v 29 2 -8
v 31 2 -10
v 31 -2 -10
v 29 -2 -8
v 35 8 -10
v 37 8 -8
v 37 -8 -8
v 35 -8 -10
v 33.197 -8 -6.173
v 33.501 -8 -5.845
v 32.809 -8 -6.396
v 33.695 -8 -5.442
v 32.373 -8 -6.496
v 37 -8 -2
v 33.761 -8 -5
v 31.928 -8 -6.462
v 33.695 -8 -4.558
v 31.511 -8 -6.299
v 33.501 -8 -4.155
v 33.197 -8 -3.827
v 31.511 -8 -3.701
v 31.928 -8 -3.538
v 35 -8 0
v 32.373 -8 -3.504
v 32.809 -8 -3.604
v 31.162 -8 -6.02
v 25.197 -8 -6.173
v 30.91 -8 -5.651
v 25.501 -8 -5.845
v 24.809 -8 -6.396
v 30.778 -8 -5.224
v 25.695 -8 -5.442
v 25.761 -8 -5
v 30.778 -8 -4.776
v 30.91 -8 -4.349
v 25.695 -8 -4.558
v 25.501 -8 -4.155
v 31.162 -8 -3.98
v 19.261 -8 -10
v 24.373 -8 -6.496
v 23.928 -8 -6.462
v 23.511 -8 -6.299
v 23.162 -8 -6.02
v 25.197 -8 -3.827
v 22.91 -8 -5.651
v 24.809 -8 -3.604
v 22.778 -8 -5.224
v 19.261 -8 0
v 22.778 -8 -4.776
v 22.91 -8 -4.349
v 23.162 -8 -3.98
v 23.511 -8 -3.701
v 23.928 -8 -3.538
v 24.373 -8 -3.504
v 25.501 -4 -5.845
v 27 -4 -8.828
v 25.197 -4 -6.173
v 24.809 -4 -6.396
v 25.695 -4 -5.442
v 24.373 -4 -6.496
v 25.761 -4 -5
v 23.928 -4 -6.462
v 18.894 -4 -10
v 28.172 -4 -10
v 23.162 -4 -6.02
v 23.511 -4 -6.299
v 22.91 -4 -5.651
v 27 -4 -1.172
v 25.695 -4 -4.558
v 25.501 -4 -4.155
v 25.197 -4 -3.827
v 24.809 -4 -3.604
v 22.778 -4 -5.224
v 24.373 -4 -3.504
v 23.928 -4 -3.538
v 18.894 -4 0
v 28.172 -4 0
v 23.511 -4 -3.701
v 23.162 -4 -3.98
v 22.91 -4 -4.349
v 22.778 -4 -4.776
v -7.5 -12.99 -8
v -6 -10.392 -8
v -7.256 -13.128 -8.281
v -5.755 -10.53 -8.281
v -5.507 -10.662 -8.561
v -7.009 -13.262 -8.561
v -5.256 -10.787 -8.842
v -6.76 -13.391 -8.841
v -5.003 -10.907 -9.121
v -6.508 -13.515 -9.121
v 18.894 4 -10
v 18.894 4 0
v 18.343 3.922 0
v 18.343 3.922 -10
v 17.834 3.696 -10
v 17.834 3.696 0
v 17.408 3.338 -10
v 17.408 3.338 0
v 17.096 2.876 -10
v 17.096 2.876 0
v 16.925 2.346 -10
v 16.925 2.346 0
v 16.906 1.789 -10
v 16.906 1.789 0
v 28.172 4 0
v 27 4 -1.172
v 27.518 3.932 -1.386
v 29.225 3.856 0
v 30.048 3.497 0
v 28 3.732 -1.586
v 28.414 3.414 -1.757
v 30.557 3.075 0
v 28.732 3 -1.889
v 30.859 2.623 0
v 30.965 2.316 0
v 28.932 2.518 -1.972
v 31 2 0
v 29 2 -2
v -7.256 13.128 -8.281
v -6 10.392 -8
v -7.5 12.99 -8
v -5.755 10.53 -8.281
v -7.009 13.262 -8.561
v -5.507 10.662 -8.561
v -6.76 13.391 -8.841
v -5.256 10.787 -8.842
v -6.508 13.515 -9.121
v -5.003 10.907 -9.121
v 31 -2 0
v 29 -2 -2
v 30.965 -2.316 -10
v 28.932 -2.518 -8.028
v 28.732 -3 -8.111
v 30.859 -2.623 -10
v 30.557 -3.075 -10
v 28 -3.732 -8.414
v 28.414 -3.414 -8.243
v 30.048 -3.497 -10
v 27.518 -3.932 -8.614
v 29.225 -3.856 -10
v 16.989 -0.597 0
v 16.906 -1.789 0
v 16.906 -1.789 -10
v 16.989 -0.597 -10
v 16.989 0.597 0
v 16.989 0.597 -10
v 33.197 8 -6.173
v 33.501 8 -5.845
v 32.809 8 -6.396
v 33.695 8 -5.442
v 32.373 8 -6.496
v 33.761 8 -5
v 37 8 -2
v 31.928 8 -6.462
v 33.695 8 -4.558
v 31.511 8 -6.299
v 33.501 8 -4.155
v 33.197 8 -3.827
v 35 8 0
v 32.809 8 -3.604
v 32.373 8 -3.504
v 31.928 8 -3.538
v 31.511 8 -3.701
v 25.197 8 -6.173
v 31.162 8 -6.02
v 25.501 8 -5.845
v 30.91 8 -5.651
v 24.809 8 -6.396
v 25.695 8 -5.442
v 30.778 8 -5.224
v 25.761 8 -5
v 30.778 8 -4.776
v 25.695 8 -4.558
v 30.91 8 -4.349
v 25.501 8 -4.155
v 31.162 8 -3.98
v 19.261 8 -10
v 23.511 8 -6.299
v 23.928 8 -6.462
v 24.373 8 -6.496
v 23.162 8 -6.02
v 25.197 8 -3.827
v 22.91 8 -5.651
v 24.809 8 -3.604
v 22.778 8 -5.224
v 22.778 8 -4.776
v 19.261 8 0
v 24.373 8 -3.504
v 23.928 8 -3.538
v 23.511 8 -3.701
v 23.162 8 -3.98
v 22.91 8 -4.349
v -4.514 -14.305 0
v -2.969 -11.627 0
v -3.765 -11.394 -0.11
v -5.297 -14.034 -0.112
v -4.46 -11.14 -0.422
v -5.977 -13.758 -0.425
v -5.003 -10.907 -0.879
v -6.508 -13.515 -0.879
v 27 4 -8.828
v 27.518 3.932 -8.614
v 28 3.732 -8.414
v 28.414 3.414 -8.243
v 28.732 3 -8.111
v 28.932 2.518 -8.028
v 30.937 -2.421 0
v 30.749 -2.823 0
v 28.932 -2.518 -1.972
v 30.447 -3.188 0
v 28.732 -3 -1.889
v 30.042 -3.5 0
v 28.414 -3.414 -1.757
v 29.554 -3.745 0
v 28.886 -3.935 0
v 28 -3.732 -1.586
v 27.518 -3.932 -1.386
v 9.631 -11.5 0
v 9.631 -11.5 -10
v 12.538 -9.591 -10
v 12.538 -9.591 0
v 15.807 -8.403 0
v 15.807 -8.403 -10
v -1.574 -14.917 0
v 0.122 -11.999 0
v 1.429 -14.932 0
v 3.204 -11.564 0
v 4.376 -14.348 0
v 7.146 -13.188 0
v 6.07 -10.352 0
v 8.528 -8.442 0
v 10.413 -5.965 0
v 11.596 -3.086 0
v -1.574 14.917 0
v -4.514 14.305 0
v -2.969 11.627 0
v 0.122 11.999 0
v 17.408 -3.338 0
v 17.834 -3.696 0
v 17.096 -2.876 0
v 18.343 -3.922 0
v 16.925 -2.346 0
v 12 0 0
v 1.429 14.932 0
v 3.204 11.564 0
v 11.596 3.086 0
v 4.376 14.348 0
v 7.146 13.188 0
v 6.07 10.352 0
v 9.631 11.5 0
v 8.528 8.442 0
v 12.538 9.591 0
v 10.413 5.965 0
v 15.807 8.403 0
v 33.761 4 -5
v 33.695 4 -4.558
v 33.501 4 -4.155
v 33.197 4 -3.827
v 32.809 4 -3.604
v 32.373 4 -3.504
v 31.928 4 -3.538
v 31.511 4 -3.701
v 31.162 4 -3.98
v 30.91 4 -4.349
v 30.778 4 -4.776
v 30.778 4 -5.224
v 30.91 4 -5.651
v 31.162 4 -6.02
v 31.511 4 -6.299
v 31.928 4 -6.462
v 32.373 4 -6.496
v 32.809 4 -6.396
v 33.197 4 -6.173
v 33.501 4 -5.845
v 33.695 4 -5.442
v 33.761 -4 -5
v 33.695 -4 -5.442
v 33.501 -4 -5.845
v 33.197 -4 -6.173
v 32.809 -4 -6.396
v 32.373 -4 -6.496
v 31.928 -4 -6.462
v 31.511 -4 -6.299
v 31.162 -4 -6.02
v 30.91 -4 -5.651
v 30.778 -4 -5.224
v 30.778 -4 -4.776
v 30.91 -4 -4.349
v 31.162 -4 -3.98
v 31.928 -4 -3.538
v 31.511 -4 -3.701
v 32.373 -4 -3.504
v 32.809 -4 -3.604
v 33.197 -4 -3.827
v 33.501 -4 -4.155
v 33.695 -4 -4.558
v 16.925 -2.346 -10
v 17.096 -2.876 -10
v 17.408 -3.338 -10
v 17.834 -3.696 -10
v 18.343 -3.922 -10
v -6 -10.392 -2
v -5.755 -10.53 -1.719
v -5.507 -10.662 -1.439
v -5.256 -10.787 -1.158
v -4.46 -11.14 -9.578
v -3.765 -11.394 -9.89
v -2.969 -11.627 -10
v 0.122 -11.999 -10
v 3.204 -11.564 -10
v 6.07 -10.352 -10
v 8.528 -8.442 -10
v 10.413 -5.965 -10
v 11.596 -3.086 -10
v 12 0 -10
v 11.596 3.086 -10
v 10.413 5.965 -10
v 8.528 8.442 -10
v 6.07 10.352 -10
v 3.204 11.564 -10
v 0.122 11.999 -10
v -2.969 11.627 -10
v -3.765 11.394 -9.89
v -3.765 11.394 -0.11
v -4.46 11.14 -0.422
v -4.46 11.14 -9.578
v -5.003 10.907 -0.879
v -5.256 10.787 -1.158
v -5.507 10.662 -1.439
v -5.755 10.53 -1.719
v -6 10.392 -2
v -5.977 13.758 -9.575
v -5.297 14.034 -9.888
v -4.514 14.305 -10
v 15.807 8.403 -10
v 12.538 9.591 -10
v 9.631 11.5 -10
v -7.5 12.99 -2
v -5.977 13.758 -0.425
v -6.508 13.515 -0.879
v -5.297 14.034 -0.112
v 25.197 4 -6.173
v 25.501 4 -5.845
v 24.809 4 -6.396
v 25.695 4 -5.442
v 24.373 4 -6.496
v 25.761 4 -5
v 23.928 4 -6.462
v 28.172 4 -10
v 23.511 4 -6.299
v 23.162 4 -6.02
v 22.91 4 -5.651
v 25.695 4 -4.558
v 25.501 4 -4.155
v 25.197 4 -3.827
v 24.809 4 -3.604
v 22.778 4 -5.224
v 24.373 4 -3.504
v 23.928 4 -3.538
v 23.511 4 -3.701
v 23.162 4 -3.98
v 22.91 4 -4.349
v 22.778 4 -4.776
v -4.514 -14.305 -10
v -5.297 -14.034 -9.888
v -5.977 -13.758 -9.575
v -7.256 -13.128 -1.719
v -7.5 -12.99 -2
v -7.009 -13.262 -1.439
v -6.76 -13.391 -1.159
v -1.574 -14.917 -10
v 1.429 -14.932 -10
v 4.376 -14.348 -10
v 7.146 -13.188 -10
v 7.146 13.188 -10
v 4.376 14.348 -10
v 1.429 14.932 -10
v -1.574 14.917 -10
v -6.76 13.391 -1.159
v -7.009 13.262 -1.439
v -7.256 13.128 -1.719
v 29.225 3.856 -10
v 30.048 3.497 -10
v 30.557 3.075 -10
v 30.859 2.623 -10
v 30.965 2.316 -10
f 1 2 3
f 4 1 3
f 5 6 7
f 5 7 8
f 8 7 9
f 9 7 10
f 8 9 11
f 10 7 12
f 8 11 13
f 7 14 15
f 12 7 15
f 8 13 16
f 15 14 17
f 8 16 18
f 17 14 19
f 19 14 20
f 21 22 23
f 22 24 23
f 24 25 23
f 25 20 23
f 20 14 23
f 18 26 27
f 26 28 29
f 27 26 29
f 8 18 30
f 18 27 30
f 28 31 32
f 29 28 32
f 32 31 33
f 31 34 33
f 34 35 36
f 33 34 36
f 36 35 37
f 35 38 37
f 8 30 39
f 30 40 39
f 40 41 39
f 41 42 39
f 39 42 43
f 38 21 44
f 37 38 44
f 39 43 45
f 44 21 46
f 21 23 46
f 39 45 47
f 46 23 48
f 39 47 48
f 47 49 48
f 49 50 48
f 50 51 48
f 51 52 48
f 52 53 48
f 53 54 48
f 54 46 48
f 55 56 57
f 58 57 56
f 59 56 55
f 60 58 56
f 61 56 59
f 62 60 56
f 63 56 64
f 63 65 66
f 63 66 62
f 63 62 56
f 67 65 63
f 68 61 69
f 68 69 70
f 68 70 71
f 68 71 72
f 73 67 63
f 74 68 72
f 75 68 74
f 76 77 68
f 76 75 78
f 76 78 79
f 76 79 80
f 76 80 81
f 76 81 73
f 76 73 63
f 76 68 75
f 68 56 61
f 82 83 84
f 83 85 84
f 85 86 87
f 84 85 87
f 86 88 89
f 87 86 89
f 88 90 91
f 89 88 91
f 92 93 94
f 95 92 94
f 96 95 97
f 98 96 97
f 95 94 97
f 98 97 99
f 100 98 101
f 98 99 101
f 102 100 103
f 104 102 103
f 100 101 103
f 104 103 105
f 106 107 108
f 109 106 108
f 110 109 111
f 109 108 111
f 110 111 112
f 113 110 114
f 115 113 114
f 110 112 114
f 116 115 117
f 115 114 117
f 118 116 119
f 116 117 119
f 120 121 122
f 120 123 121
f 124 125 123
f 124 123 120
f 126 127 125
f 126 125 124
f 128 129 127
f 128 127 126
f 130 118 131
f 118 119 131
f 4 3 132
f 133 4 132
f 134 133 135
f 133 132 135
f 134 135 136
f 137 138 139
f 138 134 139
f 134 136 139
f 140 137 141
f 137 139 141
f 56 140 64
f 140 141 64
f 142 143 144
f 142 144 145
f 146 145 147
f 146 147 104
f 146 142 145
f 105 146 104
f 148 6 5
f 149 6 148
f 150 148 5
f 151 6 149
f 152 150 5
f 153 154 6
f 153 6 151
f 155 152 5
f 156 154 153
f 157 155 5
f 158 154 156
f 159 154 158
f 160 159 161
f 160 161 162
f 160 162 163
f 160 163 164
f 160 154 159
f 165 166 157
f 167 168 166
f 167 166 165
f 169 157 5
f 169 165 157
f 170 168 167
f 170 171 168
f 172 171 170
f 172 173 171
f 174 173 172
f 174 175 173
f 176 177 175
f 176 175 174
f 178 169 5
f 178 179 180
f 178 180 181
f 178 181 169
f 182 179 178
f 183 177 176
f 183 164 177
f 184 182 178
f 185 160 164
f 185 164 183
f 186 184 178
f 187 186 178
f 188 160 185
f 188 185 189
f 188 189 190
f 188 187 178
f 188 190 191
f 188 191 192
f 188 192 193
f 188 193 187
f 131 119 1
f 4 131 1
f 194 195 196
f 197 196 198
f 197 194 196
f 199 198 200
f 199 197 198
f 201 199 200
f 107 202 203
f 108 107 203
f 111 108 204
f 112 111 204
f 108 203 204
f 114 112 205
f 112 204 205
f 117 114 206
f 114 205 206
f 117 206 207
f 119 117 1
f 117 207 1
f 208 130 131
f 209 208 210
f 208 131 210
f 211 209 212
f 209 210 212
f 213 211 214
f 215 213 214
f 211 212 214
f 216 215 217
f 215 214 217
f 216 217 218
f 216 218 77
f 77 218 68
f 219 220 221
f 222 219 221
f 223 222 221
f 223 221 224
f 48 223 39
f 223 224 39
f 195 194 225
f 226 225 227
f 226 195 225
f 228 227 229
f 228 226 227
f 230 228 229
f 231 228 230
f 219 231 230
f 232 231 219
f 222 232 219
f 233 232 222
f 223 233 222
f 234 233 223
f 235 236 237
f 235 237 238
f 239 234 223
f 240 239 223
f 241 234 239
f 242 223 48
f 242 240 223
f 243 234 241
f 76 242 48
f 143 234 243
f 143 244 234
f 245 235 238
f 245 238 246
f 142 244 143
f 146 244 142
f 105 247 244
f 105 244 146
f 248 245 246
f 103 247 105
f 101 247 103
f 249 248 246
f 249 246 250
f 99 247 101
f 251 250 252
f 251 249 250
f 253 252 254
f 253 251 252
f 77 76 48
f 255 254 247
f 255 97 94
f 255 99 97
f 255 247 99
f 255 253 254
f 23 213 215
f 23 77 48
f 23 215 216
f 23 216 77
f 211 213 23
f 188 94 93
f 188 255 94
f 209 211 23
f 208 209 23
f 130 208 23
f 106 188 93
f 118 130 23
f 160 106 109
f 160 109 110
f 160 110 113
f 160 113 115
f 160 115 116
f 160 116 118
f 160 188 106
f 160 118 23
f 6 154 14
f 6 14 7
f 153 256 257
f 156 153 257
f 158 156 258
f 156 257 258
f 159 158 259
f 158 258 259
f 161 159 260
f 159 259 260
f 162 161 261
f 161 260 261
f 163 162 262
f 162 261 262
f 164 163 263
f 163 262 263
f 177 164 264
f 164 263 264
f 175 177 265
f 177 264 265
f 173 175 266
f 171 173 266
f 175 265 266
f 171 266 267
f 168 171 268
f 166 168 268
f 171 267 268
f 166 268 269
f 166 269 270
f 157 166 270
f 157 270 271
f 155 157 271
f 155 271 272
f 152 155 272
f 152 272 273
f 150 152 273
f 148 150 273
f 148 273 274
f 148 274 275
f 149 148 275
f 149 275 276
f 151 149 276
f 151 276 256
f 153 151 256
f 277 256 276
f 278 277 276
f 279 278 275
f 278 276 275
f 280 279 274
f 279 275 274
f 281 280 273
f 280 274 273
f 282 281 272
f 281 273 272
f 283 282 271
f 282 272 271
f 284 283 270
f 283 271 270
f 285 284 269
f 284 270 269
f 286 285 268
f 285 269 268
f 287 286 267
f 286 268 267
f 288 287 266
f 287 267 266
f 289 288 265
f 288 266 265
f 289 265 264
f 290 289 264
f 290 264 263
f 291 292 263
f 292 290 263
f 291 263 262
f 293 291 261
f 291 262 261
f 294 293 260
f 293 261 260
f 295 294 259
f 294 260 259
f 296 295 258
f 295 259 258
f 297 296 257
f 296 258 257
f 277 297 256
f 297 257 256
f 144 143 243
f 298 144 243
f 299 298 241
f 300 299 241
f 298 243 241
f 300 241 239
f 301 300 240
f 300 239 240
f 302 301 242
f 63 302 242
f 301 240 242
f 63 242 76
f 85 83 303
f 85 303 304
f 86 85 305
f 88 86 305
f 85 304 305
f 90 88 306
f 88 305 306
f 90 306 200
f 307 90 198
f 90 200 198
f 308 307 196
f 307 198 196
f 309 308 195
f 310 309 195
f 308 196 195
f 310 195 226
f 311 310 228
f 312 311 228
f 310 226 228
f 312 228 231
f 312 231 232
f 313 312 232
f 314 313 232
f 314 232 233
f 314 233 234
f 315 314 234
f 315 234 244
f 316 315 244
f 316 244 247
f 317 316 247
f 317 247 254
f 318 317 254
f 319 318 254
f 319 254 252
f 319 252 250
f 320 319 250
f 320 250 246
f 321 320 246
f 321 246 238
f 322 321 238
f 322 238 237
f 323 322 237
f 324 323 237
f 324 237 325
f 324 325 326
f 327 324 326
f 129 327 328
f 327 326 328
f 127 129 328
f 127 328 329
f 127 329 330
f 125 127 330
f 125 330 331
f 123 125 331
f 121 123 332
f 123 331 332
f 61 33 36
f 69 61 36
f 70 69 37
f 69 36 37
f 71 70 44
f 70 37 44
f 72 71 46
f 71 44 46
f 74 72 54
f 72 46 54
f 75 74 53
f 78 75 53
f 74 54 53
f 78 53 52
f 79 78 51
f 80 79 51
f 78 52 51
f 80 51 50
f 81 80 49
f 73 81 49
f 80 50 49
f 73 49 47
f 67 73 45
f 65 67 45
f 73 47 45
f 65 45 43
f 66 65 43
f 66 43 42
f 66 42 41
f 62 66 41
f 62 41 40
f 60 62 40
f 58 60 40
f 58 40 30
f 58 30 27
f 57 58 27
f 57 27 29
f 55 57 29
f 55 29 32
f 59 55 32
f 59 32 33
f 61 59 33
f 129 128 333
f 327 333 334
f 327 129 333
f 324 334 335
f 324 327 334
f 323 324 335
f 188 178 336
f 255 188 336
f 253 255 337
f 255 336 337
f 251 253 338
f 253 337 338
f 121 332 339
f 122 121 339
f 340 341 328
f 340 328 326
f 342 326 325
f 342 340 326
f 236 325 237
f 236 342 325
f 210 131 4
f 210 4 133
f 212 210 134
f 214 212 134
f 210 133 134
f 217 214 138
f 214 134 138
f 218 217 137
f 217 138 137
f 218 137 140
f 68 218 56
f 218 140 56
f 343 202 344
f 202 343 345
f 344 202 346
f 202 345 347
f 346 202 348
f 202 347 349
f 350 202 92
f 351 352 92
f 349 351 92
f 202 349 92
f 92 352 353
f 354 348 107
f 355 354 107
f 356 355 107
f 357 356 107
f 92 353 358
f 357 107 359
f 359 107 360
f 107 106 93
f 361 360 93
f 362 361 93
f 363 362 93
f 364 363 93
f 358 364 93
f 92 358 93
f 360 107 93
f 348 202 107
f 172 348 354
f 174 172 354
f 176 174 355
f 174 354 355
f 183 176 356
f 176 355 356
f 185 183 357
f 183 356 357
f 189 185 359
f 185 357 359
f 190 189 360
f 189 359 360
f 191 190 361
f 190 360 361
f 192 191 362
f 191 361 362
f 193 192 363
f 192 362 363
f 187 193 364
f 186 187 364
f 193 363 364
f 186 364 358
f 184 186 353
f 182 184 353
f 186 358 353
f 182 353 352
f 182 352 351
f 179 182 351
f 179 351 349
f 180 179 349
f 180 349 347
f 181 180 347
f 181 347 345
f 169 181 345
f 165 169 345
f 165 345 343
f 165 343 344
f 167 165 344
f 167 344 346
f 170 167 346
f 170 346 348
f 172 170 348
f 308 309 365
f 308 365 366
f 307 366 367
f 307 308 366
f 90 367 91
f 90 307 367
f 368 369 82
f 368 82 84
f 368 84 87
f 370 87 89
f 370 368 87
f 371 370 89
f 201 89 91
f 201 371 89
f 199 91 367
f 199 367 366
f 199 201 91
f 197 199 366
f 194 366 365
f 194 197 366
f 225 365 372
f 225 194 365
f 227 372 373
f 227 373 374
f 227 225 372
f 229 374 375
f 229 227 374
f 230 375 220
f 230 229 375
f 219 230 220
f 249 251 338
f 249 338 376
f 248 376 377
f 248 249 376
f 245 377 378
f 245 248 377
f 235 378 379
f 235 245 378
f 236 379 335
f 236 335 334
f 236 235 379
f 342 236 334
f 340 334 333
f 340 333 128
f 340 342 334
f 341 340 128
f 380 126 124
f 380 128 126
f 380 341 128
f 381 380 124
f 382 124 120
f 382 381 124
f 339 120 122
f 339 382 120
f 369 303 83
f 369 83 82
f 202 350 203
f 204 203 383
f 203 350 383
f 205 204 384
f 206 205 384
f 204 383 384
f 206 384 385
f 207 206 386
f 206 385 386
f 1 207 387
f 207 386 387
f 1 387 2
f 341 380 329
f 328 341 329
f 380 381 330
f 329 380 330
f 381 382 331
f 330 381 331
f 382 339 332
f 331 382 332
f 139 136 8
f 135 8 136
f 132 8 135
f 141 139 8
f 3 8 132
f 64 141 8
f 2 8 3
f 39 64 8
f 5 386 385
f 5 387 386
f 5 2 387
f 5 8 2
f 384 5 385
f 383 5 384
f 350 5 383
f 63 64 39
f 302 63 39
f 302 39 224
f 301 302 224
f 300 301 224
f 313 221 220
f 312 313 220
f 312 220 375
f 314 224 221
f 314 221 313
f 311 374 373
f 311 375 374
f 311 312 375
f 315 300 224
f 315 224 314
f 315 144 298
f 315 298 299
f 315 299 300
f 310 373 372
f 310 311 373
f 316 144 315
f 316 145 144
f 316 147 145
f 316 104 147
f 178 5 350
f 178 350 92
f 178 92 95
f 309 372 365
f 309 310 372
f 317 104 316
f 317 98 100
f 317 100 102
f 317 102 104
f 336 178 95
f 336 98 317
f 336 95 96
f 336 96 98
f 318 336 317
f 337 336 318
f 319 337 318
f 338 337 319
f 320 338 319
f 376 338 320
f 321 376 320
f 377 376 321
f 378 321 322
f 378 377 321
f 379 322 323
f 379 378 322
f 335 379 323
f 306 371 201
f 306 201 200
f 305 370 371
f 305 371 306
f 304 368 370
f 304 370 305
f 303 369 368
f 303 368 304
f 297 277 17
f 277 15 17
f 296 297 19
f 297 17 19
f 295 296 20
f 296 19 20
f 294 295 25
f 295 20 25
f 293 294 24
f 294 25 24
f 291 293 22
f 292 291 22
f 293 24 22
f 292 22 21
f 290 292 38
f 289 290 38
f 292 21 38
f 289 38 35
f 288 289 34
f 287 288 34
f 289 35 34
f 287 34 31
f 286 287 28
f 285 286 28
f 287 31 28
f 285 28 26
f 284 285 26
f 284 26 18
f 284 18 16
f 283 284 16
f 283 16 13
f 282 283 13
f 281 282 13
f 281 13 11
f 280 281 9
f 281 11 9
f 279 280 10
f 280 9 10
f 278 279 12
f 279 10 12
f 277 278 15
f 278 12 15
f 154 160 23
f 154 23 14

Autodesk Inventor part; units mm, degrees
ref_plane "YZ Plane" through (0, 0, 0) normal (1, 0, 0) x (0, 1, 0)
ref_plane "XZ Plane" through (0, 0, 0) normal (0, 1, 0) x (-1, 0, 0)
ref_plane "XY Plane" through (0, 0, 0) normal (0, 0, 1) x (1, 0, 0)
ref_plane "Work Plane1" through (0, 0, 0) normal (0, 0, 1) x (1, 0, 0)
sketch "Sketch1" plane through (0, 0, 0) normal (0, 0, 1) x (1, 0, 0)
  circle A0 centre (0, 0) radius 12 projected
  circle A1 centre (0, 0) radius 12
  circle A2 centre (0, 0) radius 15
  line L0 (0, 0) -> (0, 15)
  line L1 (0, 0) -> (-7.5, 12.9904)
  line L2 (0, 0) -> (0, -15)
  line L3 (0, 0) -> (-7.5, -12.9904)
  point P0 (-6, 10.3923)
  point P1 (-6, -10.3923)
  dimension "d0" = 24
  dimension "d1" = 30
  dimension "d2" = 30
  dimension "d3" = 30
extrude "Extrusion1" add sketch "Sketch1" against normal blind 10 contours A0 L0 A2 L2 | A0 L1 A2 L0 | L2 A2 L3 A0
sketch "Sketch2" plane through (0, 0, 0) normal (0, 0, 1) x (1, 0, 0)
  line L0 (60, -8) -> (20, -8) projected
  line L1 (20, -8) -> (35, -8)
  arc A0 (-7.5, -12.9904) -> (-7.5, 12.9904) centre (0, 0) ccw projected
  line L2 (20, -8) -> (12.6886, -8)
  line L3 (35, -8) -> (35, 8)
  line L4 (35, 8) -> (20, 8)
  line L5 (20, 8) -> (12.6886, 8)
  line L6 (35, -8) -> (35, -4)
  line L7 (35, -4) -> (14.4568, -4)
  line L8 (35, 8) -> (35, 4)
  line L9 (35, 4) -> (14.4568, 4)
  dimension "d6" = 15
  dimension "d7" = 16
  dimension "d8" = 15
  dimension "d9" = 4
  dimension "d10" = 4
extrude "Extrusion2" add sketch "Sketch2" against normal up to surface (10 mm away) contours L0 L2 A0 L7 L3 | L9 A0 L5 L4 L3
fillet "Fillet1" radius 15 2 edges at (12.6886, 8, -5) (12.6886, -8, -5)
thicken "Thicken1" operation add thickness 2 both sides no extend neighbours yes toward (0.9780418, 0.2084088, 0) faces at (14.6706, 3.1261, -6.6667)
fillet "Fillet2" radius 2 2 edges at (16.5227, 4, -5) (16.5227, -4, -5)
thicken "Thicken2" operation add thickness 2 both sides no extend neighbours yes toward (1, 0, 0) faces at (35, -6.6667, -3.3333)
thicken "Thicken3" operation add thickness 2 both sides no extend neighbours yes toward (1, 0, 0) faces at (35, 6.6667, -6.6667)
sketch "Sketch4" plane through (19.2614, -8, -10) normal (0, -1, 0) x (1, 0, 0)
  line L0 (0, 0) -> (0, 10) projected
  line L1 (17.7386, 0) -> (0, 0) projected
  line L2 (17.7386, 10) -> (17.7386, 0) projected
  line L3 (0, 10) -> (17.7386, 10) projected
  line L4 (0, 10) -> (0, 0) projected
  line L5 (0, 5) -> (5, 5)
  line L6 (5, 5) -> (13, 5)
  circle A0 centre (5, 5) radius 1.5
  circle A1 centre (13, 5) radius 1.5
  point P0 (-19.2614, 10)
  dimension "d30" = 5
  dimension "d31" = 8
  dimension "d32" = 3
  dimension "d33" = 3
extrude "Extrusion4" cut sketch "Sketch4" against normal up to surface (16 mm away) contours A0 L6 L5 | L5 L6 A0 | A1
chamfer "Chamfer1" distance 2 angle 45 4 edges at (37, -6, -10) (37, 6, 0) (37, -6, 0) (37, 6, -10)
chamfer "Chamfer2" distance 2 angle 45 4 edges at (-6.75, -11.6913, -10) (-6.75, -11.6913, 0) (-6.75, 11.6913, 0) (-6.75, 11.6913, -10)
fillet "Fillet4" radius 3 4 edges at (-4.9425, -12.5607, -10) (-4.9425, 12.5607, -10) (-4.9425, -12.5607, 0) (-4.9425, 12.5607, 0)
sketch "Sketch5" plane through (18.8944, 4, -10) normal (0, -1, 0) x (1, 0, 0)
  line L0 (16.1056, 10) -> (18.1056, 8) projected
  line L1 (0.3669, 10) -> (16.1056, 10) projected
  line L2 (0.3669, 0) -> (0.3669, 10) projected
  line L3 (16.1056, 0) -> (0.3669, 0) projected
  line L4 (18.1056, 2) -> (16.1056, 0) projected
  line L5 (18.1056, 8) -> (18.1056, 2) projected
  circle A0 centre (5.3669, 5) radius 1.5 projected
  circle A1 centre (13.3669, 5) radius 1.5 projected
  line L6 (0.3669, 10) -> (16.1056, 10) projected
  line L7 (16.1056, 10) -> (10.1056, 10)
  line L8 (10.1056, 10) -> (10.1056, 0)
  point P0 (-18.8944, 10)
  point P1 (10.1056, 10)
  point P2 (10.1056, 0)
  dimension "d43" = 6
extrude "Extrusion5" add sketch "Sketch5" along normal up to surface (8 mm away) contours L0 L5 L4 L3 L8 L1
chamfer "Chamfer3" distance 2 angle 45 2 edges at (29, 0, -10) (29, 0, 0)
fillet "Fillet5" radius 2 6 edges at (30, -4, -1) (29, -4, -5) (30, -4, -9) (30, 4, -9) (29, 4, -5) (30, 4, -1)
properties part number "motor_holder_1"
